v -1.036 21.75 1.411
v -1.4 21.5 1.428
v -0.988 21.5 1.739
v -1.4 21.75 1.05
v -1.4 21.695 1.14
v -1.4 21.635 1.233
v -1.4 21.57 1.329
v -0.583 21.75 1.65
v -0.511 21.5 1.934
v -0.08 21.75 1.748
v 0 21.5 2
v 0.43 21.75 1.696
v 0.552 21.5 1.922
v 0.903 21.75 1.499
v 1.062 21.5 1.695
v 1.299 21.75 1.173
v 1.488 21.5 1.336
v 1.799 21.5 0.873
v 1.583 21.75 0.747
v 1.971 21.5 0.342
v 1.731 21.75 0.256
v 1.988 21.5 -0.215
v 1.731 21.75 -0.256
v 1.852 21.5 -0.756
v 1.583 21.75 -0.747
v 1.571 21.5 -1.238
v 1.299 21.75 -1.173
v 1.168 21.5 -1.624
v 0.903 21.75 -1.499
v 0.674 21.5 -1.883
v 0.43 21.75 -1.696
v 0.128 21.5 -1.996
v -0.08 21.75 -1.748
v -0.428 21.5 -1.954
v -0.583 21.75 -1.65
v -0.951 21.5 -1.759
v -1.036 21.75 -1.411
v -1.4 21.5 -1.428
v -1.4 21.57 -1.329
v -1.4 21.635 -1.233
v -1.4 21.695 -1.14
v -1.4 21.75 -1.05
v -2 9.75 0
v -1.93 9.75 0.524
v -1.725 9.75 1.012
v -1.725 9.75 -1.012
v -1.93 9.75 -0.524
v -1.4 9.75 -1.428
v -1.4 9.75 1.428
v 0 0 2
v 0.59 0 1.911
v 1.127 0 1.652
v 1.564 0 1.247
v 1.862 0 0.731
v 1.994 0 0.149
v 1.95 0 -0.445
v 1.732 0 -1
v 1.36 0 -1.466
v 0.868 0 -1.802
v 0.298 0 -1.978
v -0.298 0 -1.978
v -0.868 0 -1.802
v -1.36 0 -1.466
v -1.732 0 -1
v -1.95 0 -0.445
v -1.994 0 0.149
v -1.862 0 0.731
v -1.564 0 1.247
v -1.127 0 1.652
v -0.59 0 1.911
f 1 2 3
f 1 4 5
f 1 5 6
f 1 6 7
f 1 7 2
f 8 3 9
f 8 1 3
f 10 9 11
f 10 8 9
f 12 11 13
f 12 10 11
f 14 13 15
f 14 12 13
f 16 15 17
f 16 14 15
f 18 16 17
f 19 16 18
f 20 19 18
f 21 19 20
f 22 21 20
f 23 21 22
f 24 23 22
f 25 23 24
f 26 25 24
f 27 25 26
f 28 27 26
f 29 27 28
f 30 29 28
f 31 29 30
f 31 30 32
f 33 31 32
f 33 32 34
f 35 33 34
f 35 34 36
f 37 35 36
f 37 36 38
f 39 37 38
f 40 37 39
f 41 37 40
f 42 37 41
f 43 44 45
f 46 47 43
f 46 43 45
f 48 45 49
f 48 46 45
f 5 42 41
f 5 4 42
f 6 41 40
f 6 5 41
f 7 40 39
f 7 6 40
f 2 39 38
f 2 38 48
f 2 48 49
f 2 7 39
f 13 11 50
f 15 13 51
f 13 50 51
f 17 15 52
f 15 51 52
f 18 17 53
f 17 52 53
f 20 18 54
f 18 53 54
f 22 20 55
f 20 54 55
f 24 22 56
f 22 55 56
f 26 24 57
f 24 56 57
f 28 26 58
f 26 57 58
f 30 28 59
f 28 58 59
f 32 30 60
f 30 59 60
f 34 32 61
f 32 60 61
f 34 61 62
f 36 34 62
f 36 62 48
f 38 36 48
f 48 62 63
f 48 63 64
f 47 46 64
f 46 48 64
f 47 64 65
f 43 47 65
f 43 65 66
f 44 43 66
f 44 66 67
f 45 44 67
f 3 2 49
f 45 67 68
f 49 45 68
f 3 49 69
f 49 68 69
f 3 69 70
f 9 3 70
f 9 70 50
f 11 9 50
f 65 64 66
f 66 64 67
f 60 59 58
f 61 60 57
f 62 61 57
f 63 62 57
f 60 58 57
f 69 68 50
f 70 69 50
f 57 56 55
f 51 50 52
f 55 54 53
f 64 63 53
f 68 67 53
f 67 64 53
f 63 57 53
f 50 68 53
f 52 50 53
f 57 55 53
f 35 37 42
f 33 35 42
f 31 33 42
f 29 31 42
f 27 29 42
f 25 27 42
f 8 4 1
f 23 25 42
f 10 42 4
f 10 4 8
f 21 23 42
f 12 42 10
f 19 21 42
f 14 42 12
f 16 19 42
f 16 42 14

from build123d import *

# Parameters (mm, degrees)
SKETCH1_R           = 2
BOSS_EXTRUDE1_DEPTH = 21.75
CHAMFER1_SIZE       = 0.25
SKETCH2_OUTSIDE_W   = 10.494
SKETCH2_OUTSIDE_H   = 10.494
CUT_EXTRUDE1_DEPTH  = 12


with BuildPart() as part:
    # Sketch1 → Boss-Extrude1 (new body)
    with BuildSketch(Plane(origin=(0, 0, 0), x_dir=(1, 0, 0), z_dir=(0, 1, 0))):
        with Locations(Location((0, 0, 0), (0, 0, 270))):
            Circle(SKETCH1_R)
    extrude(amount=BOSS_EXTRUDE1_DEPTH)

    # Chamfer1
    chamfer1_edges = [part.edges().sort_by_distance(p)[0] for p in [
        (0, 21.75, -2),
    ]]
    chamfer(chamfer1_edges, length=CHAMFER1_SIZE)

    # Sketch2 outside → Cut-Extrude1 (cut)
    with BuildSketch(Plane(origin=(0, 21.75, 0), x_dir=(1, 0, 0), z_dir=(0, 1, 0))):
        Rectangle(SKETCH2_OUTSIDE_W, SKETCH2_OUTSIDE_H)
        with BuildLine():
            Line((-1.4, 1.428285686), (-1.4, -1.428285686))
            ThreePointArc((-1.4, -1.428285686), (2, 0), (-1.4, 1.428285686))
        make_face(mode=Mode.SUBTRACT)
    extrude(amount=-CUT_EXTRUDE1_DEPTH, mode=Mode.SUBTRACT)


solid = part.part
